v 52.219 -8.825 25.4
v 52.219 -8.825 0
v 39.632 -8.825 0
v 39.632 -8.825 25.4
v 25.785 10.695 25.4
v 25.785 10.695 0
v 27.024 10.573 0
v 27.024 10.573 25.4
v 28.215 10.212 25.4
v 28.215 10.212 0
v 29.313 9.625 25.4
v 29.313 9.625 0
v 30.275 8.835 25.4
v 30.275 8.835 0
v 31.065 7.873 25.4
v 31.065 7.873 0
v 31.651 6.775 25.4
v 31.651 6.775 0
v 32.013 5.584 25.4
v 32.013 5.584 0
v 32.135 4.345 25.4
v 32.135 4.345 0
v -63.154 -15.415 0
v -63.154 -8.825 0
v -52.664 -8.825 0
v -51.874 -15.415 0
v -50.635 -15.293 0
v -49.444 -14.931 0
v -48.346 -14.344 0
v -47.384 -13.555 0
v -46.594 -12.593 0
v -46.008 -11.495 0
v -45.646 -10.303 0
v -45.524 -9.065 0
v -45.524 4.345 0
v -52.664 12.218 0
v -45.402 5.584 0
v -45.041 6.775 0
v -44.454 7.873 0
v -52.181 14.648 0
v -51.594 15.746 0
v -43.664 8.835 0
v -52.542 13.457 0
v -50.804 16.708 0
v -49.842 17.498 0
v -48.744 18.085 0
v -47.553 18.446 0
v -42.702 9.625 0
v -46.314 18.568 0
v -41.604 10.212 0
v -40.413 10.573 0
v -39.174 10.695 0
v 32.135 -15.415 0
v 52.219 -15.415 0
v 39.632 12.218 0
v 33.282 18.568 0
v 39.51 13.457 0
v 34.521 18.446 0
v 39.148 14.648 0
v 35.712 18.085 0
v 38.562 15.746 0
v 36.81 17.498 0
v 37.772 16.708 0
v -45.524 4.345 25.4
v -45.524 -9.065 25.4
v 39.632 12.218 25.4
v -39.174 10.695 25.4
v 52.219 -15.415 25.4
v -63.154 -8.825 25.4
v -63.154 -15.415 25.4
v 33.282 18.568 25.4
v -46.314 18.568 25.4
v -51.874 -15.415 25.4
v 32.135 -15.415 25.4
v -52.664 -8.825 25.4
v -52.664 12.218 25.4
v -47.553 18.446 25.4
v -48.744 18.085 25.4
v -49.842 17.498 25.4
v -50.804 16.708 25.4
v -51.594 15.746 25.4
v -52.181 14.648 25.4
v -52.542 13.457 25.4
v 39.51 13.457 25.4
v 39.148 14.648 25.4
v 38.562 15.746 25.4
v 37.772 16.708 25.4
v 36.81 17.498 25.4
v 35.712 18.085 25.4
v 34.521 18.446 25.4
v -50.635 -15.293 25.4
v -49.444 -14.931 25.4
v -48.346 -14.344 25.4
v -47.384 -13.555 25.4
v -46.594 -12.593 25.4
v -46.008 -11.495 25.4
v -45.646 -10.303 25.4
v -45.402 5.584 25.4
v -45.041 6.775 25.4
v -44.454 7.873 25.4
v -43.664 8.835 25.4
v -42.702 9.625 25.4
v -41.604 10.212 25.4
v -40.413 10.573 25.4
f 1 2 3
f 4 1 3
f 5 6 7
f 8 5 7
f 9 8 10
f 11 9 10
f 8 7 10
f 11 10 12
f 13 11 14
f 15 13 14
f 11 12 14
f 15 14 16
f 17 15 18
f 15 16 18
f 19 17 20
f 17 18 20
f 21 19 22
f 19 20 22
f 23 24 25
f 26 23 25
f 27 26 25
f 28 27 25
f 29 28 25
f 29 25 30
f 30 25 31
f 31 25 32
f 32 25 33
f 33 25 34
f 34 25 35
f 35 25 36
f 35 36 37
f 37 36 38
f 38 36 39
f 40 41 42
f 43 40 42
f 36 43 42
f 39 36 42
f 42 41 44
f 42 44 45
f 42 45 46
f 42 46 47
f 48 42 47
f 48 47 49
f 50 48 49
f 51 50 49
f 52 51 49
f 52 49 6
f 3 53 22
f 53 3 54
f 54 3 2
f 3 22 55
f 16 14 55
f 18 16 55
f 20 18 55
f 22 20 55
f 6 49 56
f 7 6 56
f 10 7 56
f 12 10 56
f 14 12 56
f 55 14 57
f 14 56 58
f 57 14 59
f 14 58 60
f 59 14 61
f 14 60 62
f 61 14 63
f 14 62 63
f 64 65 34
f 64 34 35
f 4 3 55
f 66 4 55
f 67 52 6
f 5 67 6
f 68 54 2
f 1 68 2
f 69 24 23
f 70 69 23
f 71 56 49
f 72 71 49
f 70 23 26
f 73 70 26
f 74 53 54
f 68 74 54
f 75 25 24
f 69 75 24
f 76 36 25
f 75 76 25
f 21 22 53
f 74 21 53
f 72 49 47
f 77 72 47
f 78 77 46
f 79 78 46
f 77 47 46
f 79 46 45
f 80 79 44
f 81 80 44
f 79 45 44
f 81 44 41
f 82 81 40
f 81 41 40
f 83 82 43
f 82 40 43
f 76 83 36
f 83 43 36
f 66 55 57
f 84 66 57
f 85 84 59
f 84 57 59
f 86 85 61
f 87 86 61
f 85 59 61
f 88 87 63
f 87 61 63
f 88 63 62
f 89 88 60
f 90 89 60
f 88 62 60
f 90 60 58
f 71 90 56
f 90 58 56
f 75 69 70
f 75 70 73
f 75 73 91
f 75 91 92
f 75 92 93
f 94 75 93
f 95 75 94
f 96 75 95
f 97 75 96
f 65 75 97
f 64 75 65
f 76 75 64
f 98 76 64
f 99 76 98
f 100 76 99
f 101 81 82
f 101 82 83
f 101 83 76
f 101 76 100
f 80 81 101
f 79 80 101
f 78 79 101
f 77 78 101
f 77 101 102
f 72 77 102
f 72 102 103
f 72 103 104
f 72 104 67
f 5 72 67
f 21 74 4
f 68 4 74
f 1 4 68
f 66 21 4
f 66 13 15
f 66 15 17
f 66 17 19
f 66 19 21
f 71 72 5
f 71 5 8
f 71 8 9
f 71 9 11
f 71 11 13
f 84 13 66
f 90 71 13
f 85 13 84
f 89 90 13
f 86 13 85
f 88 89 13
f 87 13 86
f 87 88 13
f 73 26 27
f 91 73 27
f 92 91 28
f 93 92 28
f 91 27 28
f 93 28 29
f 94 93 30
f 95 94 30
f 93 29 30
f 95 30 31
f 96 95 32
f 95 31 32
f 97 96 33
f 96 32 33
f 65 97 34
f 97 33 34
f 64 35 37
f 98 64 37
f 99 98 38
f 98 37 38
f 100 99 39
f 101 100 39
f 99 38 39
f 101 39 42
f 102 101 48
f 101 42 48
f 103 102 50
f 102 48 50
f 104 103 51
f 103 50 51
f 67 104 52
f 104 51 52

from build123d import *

# Parameters (mm, degrees)
F1_DEPTH = 25.4


with BuildPart() as f1:
    # F0 (on Top) → F1 (new body)
    with BuildSketch(Plane.XY):
        with BuildLine():
            Line((-63.153848, -8.824982), (-63.153848, -15.414655))
            Line((-63.153848, -15.414655), (-51.874321, -15.414655))
            ThreePointArc((-51.874321, -15.414655), (-47.384193, -13.554783), (-45.524321, -9.064655))
            Line((-45.524321, -9.064655), (-45.524321, 4.344876))
            ThreePointArc((-45.524321, 4.344876), (-43.66445, 8.835004), (-39.174321, 10.694876))
            Line((-39.174321, 10.694876), (25.784801, 10.694876))
            ThreePointArc((25.784801, 10.694876), (30.274929, 8.835004), (32.134801, 4.344876))
            Line((32.134801, 4.344876), (32.134801, -15.414655))
            Line((32.134801, -15.414655), (52.219063, -15.414655))
            Line((52.219063, -15.414655), (52.219063, -8.824982))
            Line((52.219063, -8.824982), (39.631739, -8.824982))
            Line((39.631739, -8.824982), (39.631739, 12.218181))
            ThreePointArc((39.631739, 12.218181), (37.771867, 16.708309), (33.281739, 18.568181))
            Line((33.281739, 18.568181), (-46.313922, 18.568181))
            ThreePointArc((-46.313922, 18.568181), (-50.80405, 16.708309), (-52.663922, 12.218181))
            Line((-52.663922, 12.218181), (-52.663922, -8.824982))
            Line((-52.663922, -8.824982), (-63.153848, -8.824982))
        make_face()
    extrude(amount=F1_DEPTH)


solid = f1.part
